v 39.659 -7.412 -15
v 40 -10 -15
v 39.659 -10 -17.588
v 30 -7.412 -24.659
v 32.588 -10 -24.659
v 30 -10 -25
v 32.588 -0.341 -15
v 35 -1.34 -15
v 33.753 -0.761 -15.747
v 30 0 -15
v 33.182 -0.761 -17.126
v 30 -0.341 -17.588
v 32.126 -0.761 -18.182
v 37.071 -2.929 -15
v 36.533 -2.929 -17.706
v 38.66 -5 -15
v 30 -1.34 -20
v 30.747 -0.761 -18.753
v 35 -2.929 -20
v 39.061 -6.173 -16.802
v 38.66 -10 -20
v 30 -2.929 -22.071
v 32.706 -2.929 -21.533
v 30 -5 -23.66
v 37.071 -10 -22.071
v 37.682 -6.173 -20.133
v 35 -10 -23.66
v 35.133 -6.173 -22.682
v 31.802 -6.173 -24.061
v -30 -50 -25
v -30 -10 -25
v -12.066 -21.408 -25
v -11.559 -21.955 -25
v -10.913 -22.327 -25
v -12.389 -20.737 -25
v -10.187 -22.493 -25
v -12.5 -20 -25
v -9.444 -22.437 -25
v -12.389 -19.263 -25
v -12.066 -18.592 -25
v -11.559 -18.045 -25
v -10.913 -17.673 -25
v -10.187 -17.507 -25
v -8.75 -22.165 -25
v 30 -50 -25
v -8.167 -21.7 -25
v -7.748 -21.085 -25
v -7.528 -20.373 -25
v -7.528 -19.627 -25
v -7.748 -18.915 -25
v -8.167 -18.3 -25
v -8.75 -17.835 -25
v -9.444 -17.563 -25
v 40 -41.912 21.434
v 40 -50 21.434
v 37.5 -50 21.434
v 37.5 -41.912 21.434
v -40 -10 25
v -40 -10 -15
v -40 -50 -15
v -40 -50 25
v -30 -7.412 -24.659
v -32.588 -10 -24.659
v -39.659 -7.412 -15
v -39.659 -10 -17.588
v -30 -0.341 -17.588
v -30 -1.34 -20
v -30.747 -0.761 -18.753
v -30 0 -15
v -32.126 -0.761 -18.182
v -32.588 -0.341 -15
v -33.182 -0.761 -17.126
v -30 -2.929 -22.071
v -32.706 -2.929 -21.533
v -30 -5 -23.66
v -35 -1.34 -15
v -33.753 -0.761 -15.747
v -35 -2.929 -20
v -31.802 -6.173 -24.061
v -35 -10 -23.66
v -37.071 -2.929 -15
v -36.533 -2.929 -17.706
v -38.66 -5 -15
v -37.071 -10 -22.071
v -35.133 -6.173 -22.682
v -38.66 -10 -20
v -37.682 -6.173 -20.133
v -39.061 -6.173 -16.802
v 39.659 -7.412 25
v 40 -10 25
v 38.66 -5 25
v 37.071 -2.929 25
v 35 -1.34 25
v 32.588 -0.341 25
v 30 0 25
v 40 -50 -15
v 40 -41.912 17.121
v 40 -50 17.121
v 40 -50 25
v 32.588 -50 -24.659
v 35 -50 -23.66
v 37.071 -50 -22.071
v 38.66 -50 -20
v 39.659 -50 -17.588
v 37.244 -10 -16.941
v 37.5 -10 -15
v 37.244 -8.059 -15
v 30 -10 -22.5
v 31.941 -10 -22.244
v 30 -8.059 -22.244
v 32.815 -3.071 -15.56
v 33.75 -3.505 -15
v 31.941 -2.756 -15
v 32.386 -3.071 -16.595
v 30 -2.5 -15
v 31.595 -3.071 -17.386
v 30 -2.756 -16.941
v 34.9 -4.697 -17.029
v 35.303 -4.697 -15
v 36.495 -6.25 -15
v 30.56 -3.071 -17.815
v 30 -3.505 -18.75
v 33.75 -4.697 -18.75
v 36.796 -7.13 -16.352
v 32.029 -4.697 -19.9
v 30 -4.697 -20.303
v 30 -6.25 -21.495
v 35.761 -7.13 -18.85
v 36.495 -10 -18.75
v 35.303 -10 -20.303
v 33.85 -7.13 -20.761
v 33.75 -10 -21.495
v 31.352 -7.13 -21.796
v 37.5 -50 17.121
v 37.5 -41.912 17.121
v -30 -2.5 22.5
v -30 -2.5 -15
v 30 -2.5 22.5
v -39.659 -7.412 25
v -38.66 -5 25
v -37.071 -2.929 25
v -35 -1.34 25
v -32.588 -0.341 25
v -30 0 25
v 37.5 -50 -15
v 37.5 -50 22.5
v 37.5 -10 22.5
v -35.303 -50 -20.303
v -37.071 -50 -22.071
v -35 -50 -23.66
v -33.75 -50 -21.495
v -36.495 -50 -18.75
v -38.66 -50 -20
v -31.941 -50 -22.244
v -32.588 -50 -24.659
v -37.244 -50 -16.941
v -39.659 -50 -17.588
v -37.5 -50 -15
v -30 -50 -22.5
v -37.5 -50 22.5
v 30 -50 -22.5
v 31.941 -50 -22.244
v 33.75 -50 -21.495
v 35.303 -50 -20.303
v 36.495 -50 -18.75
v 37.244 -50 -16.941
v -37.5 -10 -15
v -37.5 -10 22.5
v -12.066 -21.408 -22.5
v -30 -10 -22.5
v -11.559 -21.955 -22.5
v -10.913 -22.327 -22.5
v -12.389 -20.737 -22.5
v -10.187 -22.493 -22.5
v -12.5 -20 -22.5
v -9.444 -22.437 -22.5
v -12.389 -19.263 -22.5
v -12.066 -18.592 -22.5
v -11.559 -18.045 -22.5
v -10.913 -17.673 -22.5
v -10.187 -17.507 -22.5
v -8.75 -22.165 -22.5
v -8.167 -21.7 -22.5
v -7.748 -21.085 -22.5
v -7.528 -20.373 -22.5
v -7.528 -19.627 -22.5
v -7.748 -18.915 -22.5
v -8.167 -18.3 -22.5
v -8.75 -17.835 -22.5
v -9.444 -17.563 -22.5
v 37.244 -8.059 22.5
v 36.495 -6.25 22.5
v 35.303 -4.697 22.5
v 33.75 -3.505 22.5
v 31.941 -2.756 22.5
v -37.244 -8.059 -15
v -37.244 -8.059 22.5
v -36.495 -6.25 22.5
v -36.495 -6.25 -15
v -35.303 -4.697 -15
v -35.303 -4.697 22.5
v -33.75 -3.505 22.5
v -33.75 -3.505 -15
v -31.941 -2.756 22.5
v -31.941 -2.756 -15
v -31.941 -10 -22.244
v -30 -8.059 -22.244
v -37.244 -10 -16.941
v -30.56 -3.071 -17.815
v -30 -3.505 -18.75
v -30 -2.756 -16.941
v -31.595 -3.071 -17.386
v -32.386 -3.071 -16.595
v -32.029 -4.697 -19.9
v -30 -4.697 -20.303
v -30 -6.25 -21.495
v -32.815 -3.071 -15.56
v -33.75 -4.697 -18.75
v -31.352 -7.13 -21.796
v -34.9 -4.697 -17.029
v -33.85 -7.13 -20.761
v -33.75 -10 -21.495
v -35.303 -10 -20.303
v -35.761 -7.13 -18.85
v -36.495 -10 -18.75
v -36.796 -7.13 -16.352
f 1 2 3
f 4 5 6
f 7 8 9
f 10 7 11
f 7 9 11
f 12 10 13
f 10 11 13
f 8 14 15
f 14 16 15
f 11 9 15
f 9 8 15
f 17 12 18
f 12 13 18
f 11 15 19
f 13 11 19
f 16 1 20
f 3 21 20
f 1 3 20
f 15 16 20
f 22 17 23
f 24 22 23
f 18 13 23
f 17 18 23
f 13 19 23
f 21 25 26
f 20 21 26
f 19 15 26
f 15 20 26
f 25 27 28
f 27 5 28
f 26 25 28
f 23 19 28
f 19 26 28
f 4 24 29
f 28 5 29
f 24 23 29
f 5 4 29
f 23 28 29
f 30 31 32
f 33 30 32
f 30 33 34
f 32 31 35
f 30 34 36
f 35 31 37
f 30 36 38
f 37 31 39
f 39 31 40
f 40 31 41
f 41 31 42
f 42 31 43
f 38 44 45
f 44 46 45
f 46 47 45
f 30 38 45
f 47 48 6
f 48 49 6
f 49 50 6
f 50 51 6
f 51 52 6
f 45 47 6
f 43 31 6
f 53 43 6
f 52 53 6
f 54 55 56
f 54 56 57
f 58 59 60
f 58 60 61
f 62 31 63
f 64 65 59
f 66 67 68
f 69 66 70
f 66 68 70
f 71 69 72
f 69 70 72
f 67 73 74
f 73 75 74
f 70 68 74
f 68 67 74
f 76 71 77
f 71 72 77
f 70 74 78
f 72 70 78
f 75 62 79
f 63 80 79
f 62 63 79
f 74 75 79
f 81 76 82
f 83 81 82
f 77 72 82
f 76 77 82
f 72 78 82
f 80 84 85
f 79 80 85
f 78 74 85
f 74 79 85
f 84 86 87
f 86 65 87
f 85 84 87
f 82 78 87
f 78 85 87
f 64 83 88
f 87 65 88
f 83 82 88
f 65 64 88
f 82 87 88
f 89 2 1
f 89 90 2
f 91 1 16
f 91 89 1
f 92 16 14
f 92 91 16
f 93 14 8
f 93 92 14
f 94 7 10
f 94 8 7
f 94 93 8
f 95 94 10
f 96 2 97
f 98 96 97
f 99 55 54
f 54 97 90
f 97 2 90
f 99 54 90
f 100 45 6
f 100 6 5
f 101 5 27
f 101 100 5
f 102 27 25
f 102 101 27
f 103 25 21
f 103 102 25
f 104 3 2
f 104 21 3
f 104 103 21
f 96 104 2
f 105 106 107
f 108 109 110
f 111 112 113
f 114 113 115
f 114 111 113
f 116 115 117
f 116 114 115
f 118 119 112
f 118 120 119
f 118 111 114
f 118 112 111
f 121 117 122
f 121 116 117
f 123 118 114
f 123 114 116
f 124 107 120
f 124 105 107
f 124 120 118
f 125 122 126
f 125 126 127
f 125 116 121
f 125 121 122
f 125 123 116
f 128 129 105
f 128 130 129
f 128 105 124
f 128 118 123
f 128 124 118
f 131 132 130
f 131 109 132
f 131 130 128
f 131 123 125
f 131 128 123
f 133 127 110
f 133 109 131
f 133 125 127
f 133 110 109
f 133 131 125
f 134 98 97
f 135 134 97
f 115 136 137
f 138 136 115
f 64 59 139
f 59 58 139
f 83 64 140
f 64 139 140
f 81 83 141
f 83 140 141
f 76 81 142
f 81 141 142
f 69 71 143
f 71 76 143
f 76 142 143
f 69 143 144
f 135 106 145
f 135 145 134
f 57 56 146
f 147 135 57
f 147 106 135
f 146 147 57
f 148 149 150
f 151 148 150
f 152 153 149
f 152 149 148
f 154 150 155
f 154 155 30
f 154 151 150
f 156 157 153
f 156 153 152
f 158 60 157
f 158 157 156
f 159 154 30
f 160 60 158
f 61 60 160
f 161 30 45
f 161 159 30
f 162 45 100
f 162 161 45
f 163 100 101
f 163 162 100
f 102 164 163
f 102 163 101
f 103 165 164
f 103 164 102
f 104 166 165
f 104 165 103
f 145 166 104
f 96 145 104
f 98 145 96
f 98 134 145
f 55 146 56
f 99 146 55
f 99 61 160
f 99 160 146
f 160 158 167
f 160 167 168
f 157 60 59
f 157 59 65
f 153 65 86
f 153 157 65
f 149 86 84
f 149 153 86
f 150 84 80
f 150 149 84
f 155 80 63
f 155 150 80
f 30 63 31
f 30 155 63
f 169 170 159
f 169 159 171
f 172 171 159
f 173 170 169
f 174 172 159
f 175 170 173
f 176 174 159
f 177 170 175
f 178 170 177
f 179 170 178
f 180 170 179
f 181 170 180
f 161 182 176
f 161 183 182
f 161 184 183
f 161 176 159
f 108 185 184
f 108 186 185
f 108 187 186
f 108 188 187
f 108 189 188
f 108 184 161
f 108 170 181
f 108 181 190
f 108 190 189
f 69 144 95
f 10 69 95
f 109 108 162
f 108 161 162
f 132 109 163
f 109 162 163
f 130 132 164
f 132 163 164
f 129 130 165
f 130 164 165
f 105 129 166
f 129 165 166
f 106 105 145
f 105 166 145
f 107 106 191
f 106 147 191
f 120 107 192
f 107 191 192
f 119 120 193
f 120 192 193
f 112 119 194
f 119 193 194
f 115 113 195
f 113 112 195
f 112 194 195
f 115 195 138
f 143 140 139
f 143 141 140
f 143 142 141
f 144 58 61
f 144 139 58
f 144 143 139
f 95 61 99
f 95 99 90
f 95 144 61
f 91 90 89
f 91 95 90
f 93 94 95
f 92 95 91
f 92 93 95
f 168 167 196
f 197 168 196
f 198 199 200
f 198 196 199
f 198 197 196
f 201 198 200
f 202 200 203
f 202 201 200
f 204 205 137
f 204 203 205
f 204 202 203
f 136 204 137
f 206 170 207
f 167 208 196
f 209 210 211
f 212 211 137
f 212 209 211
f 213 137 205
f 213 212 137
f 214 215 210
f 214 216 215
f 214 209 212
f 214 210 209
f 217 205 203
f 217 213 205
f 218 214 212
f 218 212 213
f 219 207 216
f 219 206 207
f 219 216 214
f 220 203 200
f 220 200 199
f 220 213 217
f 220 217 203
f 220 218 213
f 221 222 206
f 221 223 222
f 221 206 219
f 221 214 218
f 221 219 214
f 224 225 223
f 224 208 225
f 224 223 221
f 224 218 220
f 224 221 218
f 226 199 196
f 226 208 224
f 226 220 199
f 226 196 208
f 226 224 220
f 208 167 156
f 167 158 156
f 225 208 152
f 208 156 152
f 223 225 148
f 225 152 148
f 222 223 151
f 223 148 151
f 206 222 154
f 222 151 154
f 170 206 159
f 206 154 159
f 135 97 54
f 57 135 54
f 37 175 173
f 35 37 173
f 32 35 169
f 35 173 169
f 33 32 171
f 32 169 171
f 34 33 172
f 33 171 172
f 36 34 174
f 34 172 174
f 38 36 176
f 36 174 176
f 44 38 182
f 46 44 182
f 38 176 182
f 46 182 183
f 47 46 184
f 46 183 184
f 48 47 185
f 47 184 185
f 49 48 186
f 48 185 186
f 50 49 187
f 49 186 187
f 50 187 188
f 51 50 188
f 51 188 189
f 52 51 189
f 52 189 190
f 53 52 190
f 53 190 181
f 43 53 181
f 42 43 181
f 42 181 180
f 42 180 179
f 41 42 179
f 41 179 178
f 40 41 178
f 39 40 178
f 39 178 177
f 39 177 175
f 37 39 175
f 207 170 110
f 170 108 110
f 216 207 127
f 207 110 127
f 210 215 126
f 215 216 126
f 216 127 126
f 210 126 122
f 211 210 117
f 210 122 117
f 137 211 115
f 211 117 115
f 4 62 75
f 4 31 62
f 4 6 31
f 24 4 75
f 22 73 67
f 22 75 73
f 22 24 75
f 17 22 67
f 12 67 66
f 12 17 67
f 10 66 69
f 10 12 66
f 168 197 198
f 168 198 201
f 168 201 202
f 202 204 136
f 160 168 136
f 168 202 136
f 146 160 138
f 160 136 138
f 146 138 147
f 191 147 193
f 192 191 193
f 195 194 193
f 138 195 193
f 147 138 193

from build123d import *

# Parameters (mm, degrees)
F0_W     = 80
F0_H     = 50
F1_DEPTH = 50
F2_R     = 10
F3_T     = -2.5
F5_D     = 5
F5_DEPTH = 12
F6_W     = 8.087612
F6_H     = 4.312344
F7_DEPTH = 25


with BuildPart() as f1:
    # F0 (on Front) → F1 (new body)
    with BuildSketch(Plane.XZ):
        Rectangle(F0_W, F0_H)
    extrude(amount=F1_DEPTH)

    # F2
    f2_edges = [f1.edges().sort_by_distance(p)[0] for p in [
        (40, -25, -25),
        (-40, -25, -25),
        (40, 0, 0),
        (0, 0, -25),
        (-40, 0, 0),
    ]]
    fillet(f2_edges, radius=F2_R)

    # F3
    f3_openings = [f1.faces().sort_by_distance(p)[0] for p in [
        (0, -50, 0.246934),
    ]]
    offset(amount=F3_T, openings=f3_openings)

    # F5
    with Locations(Plane(origin=(0, 0, -25), x_dir=(1, 0, 0), z_dir=(0, 0, -1))):
        with Locations((-10, 20)):
            Hole(F5_D / 2, depth=F5_DEPTH)

    # F6 (on face) → F7 (cut)
    with BuildSketch(Plane.YZ.offset(40)):
        with Locations((-45.956194, 19.277418)):
            Rectangle(F6_W, F6_H)
    extrude(amount=-F7_DEPTH, mode=Mode.SUBTRACT)


solid = f1.part
